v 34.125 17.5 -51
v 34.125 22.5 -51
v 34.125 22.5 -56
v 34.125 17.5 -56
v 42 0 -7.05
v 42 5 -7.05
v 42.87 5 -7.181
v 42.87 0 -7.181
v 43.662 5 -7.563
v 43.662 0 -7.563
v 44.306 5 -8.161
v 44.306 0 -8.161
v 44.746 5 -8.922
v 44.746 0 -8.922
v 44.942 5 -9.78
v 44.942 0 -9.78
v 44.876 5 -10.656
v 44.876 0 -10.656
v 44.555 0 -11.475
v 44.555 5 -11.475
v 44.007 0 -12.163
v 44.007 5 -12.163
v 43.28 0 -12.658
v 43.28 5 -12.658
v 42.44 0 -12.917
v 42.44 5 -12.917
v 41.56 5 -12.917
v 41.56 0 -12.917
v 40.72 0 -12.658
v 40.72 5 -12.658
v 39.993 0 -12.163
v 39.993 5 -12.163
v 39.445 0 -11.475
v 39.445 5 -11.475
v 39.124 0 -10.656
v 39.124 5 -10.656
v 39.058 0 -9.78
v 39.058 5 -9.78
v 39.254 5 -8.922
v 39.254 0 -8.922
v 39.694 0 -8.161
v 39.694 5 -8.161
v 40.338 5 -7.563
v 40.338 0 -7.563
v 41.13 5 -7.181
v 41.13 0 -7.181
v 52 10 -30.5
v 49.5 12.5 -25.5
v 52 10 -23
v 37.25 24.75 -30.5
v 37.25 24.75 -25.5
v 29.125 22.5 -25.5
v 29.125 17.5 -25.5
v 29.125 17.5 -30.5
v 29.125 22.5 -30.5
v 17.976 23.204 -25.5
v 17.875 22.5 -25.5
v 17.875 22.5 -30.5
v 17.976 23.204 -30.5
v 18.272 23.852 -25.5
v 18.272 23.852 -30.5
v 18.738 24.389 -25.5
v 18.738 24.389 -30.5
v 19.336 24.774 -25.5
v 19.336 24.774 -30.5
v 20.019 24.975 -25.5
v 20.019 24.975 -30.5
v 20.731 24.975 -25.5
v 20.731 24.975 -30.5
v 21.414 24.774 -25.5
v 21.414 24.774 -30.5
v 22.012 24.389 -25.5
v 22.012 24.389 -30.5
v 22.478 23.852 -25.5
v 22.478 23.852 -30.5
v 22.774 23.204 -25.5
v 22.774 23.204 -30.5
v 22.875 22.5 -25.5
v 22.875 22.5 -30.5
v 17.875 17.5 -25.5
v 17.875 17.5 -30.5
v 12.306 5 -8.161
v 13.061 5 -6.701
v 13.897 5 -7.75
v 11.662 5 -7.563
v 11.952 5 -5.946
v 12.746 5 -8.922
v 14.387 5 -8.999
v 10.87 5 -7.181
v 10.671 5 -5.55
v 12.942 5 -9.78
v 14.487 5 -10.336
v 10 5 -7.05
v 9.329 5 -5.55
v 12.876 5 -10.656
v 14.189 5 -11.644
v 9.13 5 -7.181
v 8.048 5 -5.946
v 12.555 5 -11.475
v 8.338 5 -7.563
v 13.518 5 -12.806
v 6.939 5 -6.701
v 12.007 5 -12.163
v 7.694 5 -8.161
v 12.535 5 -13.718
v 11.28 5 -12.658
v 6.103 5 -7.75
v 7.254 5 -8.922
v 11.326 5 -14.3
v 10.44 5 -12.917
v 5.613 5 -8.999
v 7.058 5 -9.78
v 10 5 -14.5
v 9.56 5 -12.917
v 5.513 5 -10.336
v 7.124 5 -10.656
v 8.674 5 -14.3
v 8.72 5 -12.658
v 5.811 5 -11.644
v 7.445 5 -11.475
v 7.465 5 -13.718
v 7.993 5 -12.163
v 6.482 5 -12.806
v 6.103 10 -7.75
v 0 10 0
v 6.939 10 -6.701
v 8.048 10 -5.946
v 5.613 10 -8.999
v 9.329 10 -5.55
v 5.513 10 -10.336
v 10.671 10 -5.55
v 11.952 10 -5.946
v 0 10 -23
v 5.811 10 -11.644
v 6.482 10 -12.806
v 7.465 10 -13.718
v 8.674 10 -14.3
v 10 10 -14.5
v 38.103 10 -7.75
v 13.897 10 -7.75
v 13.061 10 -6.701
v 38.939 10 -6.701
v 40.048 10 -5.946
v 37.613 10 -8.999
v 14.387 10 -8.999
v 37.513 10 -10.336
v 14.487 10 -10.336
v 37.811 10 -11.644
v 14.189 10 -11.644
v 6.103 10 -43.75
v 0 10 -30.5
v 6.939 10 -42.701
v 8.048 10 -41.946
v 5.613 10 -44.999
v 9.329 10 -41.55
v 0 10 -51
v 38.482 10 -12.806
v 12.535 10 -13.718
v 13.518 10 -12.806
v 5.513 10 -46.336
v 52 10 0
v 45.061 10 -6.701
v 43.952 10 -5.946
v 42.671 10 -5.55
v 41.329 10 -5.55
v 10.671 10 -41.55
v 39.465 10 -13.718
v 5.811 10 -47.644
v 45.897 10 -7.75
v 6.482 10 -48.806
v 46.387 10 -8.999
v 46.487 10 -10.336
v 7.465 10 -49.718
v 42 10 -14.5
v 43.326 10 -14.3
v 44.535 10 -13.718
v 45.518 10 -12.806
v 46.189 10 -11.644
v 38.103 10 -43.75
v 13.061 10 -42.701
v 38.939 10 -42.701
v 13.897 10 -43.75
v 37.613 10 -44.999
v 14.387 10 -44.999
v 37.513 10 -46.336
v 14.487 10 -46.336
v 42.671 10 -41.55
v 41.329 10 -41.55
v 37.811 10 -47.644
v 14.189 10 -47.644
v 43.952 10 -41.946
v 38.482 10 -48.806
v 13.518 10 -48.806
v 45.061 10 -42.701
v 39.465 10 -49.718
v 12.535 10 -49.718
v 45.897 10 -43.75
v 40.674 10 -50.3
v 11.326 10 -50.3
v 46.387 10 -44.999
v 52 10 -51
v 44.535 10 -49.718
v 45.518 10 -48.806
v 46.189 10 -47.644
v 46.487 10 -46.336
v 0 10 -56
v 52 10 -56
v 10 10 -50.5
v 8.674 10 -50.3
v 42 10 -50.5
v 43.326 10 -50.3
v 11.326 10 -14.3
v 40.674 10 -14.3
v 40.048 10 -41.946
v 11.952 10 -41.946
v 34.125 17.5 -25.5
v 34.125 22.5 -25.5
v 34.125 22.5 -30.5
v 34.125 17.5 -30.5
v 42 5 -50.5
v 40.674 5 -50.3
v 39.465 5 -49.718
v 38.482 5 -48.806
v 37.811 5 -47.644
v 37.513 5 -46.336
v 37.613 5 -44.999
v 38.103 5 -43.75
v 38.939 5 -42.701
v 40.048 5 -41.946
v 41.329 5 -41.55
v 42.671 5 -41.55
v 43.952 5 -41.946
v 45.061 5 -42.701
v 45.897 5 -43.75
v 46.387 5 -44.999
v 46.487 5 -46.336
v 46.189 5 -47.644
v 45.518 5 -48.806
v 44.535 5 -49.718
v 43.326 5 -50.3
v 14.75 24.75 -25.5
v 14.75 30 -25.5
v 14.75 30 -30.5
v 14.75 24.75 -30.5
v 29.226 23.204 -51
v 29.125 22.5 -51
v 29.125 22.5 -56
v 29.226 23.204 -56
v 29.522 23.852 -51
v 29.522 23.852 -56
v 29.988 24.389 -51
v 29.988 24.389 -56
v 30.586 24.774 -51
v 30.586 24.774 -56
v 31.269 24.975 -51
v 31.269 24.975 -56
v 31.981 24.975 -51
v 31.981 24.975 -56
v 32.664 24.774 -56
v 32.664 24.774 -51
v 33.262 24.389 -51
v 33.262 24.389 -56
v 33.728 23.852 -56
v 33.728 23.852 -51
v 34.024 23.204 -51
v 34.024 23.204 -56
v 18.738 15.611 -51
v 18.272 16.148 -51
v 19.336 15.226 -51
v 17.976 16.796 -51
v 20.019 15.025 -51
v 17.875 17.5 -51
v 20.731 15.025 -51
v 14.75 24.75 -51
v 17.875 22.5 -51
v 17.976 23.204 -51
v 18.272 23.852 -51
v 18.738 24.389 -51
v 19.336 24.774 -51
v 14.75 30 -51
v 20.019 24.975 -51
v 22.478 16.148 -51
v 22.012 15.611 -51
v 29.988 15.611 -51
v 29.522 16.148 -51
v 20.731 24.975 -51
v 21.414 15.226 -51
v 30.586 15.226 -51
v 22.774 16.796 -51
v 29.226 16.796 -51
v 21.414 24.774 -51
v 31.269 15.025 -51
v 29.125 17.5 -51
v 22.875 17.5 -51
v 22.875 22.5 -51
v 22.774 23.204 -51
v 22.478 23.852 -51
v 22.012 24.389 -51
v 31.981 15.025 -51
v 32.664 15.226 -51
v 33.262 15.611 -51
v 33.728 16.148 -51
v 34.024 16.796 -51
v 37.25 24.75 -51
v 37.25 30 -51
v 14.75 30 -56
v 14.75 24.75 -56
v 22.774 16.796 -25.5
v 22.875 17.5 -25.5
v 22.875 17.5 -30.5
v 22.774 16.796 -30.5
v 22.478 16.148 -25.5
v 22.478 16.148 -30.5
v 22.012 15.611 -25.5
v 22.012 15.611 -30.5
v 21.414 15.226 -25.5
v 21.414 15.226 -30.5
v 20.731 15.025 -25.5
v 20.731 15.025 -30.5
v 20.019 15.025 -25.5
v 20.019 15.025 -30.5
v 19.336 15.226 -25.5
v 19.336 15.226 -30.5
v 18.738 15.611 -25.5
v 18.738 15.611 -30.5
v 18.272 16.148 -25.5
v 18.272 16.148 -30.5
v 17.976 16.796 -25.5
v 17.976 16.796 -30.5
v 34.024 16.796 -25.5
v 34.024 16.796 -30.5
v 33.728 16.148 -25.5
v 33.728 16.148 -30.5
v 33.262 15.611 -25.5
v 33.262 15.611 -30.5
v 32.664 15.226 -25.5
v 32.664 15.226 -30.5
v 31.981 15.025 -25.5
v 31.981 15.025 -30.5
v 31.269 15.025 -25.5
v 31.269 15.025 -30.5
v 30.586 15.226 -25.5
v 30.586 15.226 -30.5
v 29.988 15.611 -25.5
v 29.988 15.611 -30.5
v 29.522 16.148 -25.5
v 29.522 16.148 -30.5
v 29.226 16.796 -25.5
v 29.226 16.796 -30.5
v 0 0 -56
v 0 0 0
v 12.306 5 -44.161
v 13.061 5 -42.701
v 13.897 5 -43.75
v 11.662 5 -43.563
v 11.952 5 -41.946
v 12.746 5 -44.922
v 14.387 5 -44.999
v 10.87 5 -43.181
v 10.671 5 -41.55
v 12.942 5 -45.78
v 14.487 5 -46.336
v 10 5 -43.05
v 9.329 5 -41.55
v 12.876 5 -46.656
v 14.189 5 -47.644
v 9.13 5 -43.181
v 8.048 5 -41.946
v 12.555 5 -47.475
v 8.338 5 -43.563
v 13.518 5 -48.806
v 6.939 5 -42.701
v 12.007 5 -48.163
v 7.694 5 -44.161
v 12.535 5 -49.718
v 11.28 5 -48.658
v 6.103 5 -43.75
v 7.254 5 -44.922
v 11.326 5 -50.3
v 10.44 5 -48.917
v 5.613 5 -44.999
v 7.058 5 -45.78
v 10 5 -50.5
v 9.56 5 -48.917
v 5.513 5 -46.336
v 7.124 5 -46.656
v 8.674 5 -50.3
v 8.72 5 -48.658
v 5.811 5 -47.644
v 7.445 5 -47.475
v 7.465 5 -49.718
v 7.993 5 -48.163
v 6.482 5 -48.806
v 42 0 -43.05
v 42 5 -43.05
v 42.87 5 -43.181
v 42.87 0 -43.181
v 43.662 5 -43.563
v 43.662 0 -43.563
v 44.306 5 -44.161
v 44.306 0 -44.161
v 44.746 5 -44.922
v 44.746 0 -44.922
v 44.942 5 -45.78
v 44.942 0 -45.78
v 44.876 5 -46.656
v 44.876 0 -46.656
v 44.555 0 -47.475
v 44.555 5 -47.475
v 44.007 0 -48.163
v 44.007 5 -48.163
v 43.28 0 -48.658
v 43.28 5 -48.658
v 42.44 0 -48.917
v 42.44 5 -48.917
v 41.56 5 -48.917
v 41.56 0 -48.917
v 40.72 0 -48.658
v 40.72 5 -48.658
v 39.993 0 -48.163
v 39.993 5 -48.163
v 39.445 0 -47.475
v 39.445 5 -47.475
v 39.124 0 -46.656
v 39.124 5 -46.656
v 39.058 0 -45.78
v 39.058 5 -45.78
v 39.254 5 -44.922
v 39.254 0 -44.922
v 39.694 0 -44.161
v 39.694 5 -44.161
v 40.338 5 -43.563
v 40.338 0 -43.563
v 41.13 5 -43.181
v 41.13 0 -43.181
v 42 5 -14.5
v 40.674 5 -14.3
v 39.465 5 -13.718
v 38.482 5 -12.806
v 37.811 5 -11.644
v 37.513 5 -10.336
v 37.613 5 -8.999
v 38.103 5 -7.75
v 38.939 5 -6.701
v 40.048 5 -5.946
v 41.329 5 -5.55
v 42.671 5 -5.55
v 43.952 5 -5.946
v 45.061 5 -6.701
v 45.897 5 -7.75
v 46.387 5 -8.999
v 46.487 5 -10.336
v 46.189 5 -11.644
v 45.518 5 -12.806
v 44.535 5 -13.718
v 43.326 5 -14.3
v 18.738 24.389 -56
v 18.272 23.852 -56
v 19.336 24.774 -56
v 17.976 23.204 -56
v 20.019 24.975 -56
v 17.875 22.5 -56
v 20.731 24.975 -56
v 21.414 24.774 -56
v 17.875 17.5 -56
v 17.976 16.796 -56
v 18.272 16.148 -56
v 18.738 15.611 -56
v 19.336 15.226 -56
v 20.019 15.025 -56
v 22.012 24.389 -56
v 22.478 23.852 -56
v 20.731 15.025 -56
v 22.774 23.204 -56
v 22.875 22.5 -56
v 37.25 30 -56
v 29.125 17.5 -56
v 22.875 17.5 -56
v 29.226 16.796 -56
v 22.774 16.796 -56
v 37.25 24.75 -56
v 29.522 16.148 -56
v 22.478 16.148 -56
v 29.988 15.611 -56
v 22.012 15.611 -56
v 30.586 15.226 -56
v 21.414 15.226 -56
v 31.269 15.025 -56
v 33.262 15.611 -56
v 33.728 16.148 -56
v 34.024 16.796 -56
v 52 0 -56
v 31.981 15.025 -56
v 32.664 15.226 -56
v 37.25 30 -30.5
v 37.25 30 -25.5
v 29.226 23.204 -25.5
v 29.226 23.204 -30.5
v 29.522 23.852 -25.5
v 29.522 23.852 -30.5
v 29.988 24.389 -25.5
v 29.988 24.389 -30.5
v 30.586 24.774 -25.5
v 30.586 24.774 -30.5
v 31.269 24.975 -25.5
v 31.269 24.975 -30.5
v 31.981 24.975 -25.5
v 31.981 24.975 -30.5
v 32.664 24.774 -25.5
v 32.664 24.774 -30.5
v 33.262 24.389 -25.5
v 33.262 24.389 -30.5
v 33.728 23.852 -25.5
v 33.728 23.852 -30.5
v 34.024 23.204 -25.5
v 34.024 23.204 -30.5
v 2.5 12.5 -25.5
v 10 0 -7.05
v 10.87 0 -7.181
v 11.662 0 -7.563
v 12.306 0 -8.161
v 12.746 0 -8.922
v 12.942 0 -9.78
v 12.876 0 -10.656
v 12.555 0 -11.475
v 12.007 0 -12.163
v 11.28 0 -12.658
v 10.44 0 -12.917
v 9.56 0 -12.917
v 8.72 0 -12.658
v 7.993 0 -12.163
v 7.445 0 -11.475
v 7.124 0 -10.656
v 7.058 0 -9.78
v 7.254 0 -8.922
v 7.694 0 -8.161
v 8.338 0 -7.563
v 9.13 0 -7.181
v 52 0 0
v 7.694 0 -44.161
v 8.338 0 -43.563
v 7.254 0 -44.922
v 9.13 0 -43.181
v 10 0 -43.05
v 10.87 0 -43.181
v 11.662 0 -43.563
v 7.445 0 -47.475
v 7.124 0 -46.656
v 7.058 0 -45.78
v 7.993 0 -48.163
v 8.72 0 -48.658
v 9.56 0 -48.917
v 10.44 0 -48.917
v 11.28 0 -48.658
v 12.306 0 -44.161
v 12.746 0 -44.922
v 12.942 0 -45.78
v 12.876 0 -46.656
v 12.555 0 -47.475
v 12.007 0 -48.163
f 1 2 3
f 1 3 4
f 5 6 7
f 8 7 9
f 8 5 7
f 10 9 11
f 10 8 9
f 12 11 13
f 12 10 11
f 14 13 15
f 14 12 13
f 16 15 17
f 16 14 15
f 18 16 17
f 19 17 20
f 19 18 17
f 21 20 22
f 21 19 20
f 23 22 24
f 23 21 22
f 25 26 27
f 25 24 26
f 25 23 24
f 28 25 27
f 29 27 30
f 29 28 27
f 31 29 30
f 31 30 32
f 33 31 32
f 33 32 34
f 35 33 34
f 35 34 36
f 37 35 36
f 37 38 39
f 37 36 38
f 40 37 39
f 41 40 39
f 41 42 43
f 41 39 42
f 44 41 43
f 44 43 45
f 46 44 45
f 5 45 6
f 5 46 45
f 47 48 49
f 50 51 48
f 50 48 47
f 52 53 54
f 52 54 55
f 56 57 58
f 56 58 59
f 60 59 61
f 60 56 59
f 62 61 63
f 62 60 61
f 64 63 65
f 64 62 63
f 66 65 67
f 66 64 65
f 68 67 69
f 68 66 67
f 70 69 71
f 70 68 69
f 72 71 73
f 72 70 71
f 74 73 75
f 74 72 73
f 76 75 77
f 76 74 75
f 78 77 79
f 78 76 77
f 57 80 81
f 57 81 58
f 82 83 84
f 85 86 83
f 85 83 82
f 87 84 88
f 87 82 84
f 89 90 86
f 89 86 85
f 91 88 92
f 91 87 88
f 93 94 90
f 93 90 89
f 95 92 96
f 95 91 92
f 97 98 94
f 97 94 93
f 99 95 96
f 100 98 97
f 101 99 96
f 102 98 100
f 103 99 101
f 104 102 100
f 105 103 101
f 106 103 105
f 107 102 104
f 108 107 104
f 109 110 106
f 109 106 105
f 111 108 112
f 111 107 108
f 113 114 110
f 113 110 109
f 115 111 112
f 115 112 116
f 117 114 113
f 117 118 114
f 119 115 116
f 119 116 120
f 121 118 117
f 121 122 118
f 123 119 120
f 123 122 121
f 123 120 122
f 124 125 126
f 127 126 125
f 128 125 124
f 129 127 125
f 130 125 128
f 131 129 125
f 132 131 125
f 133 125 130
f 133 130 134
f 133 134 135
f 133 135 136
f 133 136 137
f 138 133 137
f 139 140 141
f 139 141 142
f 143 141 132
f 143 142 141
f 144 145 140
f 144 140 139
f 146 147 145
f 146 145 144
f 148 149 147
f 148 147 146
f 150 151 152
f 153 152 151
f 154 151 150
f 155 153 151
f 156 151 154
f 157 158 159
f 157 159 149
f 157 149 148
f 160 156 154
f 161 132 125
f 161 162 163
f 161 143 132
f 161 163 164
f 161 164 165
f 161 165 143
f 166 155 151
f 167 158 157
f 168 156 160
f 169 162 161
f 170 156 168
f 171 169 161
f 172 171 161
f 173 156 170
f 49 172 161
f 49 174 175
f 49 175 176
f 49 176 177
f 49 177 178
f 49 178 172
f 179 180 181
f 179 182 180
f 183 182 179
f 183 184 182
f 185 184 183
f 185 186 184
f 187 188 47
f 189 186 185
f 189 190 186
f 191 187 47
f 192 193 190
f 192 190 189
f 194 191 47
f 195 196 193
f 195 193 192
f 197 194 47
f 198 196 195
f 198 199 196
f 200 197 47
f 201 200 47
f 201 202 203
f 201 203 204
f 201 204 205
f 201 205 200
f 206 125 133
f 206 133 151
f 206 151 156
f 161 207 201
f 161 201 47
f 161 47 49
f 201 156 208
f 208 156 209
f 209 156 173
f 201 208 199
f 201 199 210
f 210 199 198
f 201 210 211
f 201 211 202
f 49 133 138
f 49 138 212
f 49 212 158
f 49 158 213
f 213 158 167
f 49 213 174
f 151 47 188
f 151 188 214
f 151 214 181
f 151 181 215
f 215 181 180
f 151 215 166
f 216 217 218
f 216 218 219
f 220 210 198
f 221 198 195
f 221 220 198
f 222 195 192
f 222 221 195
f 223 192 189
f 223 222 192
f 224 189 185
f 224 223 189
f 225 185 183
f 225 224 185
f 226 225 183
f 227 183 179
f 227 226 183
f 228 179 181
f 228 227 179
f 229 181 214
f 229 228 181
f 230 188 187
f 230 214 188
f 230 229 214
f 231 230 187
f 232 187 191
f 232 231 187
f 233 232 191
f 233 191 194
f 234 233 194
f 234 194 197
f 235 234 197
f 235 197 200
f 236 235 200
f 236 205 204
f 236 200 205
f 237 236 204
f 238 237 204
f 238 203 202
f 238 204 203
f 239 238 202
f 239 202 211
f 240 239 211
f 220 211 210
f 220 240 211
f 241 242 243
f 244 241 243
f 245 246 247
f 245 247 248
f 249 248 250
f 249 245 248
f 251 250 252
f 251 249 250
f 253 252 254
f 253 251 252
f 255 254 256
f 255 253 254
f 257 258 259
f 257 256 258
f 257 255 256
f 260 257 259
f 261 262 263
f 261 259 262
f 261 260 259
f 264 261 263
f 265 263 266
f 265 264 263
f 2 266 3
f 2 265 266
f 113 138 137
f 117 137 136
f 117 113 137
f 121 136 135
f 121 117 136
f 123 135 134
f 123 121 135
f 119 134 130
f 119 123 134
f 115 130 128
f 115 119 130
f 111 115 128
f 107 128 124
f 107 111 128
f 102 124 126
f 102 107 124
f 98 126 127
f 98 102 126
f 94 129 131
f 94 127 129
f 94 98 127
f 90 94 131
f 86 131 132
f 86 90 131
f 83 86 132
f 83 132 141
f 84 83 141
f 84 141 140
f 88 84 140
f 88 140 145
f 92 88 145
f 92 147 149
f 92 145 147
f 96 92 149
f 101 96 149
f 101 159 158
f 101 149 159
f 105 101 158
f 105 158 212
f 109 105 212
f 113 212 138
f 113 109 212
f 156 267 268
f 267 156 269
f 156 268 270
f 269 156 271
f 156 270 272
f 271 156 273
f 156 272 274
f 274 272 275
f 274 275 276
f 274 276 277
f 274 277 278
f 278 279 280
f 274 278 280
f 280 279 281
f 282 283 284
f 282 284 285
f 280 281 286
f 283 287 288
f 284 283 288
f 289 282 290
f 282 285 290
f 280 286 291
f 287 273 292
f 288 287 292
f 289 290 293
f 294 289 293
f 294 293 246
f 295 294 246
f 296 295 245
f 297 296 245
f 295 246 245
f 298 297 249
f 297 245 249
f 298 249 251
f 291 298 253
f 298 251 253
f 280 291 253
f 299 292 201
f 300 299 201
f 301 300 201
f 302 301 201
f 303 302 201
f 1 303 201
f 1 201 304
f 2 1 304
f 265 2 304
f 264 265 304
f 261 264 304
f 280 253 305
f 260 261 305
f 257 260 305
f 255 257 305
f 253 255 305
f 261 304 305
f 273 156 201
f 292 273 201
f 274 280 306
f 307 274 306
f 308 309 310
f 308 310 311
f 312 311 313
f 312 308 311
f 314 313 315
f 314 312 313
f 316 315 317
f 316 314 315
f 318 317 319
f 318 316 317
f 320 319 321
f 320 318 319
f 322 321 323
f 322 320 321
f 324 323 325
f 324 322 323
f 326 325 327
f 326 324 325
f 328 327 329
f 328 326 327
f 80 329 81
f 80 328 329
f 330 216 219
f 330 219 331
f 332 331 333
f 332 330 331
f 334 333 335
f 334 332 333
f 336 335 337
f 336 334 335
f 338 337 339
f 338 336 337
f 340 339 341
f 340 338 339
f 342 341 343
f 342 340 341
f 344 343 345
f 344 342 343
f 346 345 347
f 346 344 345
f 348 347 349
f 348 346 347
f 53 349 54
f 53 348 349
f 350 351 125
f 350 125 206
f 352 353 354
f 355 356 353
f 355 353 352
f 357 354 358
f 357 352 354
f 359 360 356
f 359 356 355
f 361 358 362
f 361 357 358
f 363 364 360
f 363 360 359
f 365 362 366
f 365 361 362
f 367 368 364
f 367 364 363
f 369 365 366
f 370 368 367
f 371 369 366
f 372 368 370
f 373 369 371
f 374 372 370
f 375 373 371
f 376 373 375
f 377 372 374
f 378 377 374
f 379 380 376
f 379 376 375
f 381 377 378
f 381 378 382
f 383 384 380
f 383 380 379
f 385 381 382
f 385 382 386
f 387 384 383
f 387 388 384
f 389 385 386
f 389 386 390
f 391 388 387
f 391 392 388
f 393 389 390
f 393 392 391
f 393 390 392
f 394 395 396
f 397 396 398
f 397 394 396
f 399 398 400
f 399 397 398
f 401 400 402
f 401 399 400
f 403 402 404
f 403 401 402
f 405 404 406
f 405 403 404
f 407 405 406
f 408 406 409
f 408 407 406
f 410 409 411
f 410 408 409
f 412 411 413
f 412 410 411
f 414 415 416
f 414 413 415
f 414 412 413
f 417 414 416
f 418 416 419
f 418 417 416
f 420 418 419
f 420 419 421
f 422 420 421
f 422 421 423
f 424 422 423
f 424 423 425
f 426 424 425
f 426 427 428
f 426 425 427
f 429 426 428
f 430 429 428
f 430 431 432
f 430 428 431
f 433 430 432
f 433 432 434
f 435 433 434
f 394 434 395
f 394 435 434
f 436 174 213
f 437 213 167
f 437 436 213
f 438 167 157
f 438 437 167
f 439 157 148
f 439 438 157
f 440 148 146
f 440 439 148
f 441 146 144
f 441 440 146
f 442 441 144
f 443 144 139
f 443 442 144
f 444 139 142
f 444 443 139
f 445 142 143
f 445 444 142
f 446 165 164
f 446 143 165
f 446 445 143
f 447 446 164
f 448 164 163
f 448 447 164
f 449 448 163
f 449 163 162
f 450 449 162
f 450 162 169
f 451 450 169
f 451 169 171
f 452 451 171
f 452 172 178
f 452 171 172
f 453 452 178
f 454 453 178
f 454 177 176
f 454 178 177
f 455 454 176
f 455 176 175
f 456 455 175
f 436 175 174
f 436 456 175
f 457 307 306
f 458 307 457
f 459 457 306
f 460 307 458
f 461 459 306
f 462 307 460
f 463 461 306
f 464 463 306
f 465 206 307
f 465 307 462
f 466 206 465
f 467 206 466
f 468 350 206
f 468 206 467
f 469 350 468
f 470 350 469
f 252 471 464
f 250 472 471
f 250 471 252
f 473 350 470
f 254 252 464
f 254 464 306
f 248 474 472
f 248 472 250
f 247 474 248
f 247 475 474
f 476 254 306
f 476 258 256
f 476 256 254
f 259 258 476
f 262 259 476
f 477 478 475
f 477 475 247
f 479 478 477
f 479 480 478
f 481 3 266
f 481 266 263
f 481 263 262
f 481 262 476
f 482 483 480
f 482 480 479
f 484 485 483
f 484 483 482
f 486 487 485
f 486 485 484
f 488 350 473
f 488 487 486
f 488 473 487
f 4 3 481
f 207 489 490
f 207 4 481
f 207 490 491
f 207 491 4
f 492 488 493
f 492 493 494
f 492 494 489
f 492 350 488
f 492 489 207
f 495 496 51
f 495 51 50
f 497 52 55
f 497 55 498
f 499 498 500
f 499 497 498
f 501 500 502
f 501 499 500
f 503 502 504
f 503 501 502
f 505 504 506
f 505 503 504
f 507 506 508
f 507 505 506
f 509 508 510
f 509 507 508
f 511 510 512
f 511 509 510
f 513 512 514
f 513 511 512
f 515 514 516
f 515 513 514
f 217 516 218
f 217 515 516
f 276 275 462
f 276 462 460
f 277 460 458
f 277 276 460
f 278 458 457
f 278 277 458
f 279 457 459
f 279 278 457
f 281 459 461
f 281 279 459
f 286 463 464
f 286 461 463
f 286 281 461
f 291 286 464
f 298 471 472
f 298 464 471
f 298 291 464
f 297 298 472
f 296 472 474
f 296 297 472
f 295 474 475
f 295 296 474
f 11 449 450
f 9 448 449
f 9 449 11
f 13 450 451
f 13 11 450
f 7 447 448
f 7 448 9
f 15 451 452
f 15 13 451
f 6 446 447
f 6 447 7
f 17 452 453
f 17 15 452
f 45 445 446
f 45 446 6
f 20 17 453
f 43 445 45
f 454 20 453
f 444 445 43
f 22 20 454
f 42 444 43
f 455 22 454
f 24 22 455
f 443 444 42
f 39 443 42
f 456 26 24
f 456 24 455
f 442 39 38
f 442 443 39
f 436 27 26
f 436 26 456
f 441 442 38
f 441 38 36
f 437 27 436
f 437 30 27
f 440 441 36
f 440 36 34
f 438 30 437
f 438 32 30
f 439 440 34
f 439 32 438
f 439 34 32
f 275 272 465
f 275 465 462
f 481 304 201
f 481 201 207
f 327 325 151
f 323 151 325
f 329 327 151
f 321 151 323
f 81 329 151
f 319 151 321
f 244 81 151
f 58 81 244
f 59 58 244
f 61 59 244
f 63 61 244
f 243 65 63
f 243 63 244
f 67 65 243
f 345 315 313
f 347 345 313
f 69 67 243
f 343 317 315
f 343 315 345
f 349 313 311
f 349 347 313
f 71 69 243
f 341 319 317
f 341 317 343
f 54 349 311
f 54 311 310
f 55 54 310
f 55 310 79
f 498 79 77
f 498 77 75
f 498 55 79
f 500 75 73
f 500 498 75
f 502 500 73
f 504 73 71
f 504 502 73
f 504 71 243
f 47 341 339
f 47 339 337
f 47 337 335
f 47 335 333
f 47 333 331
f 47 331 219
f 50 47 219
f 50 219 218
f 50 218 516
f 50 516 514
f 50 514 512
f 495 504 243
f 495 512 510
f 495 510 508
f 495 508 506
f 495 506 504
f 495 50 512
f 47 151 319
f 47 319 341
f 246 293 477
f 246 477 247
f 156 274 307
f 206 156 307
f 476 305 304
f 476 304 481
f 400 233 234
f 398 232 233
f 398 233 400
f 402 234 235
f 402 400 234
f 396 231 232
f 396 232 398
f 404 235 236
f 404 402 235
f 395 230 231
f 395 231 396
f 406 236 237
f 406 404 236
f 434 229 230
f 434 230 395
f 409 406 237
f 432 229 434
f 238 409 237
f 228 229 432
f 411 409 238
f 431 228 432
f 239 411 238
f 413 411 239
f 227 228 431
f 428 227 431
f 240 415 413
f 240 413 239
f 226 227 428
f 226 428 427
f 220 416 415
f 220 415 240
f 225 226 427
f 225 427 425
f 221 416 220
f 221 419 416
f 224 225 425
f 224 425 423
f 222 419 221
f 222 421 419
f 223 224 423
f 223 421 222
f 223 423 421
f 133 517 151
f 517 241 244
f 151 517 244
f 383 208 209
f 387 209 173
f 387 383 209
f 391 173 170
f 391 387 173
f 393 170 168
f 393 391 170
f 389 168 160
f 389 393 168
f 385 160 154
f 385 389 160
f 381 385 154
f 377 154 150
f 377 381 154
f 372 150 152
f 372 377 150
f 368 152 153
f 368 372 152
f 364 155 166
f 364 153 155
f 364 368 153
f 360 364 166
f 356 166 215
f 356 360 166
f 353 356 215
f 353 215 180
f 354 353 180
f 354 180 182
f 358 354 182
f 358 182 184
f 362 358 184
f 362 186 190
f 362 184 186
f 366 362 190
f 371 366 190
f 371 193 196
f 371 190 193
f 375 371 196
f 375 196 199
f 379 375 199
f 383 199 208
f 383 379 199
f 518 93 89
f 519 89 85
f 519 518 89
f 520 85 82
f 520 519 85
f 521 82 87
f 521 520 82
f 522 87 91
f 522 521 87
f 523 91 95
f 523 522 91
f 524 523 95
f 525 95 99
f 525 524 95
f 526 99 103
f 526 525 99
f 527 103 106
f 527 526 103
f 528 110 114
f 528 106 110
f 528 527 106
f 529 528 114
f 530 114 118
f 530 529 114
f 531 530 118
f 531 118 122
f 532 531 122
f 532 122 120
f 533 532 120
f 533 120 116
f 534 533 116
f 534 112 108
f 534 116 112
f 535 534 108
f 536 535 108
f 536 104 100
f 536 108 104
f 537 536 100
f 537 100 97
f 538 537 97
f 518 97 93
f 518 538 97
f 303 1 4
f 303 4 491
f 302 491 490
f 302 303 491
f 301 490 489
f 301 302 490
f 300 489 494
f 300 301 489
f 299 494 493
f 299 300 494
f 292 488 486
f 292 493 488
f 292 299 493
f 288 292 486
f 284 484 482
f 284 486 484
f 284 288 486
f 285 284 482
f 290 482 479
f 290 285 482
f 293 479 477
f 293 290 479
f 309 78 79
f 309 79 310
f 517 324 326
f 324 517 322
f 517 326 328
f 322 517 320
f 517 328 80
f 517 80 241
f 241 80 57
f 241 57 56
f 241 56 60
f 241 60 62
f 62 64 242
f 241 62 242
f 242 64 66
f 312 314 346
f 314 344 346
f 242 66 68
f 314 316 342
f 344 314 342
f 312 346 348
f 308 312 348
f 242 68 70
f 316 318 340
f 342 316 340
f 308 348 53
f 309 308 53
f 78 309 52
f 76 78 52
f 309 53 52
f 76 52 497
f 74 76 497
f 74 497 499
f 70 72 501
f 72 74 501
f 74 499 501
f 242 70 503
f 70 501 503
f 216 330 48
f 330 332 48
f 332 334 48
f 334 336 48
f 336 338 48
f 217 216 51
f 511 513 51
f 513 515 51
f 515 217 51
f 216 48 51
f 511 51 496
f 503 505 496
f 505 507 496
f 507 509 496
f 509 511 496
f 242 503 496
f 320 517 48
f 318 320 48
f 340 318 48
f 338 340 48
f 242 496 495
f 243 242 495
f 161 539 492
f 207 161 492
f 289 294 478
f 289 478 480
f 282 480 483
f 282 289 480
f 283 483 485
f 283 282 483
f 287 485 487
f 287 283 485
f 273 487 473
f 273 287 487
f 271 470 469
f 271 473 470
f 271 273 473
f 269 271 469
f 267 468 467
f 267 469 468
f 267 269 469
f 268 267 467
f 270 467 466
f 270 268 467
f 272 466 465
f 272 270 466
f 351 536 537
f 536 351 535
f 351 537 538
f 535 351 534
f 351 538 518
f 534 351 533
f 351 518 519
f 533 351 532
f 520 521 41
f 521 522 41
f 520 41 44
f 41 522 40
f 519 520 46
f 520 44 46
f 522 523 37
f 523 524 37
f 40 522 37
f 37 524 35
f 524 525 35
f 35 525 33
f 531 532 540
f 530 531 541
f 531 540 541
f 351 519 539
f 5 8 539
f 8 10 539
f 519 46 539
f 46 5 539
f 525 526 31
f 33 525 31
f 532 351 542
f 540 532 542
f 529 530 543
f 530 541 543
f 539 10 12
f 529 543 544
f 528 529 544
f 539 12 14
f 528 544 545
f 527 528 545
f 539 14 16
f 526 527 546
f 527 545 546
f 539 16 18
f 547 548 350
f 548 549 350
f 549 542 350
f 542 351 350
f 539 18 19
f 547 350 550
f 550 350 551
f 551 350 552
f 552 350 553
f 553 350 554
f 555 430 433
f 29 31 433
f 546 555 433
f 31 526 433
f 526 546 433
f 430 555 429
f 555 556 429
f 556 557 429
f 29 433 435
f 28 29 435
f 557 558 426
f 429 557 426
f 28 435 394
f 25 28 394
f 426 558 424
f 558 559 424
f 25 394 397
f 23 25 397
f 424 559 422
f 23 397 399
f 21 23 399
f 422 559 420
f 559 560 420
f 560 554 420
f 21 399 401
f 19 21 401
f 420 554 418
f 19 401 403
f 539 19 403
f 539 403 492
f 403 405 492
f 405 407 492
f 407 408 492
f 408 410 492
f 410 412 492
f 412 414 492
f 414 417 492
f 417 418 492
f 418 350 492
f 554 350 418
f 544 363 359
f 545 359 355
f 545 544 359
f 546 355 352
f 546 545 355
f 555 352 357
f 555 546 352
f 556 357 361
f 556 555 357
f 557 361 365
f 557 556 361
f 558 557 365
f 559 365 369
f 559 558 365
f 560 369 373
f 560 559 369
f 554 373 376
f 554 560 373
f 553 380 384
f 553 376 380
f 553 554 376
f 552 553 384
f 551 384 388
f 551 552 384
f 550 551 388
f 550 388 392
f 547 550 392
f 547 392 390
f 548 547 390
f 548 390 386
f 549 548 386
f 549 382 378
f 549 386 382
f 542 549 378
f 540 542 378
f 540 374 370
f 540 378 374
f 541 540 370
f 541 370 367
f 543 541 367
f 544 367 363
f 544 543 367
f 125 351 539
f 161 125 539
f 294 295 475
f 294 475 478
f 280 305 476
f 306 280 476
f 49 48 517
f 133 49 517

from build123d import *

# Parameters (mm, degrees)
SKETCH1_W               = 52
SKETCH1_H               = 56
SKETCH1_R               = 2.95
BOSS_EXTRUDE1_DEPTH     = 10
CUT_EXTRUDE1_DEPTH      = 78.071395472
CUT_EXTRUDE1_DEPTH_BACK = 5
SKETCH2_R               = 4.5
BOSS_EXTRUDE2_START     = -14.75
SKETCH3_W               = 5
SKETCH3_H               = 20
BOSS_EXTRUDE2_DEPTH     = 22.5
CUT_EXTRUDE2_REACH      = 69.337
CHAMFER1_SIZE           = 14.75
CHAMFER2_SIZE           = 2.5


with BuildPart() as part:
    # Sketch1 → Boss-Extrude1 (new body)
    with BuildSketch(Plane(origin=(0, 0, 0), x_dir=(1, 0, 0), z_dir=(0, 1, 0))):
        with Locations((26, 28)):
            Rectangle(SKETCH1_W, SKETCH1_H)
        with Locations(Location((10, 46, 0), (0, 0, 270))):
            Circle(SKETCH1_R, mode=Mode.SUBTRACT)
        with Locations(Location((42, 46, 0), (0, 0, 270))):
            Circle(SKETCH1_R, mode=Mode.SUBTRACT)
        with Locations(Location((42, 10, 0), (0, 0, 270))):
            Circle(SKETCH1_R, mode=Mode.SUBTRACT)
        with Locations(Location((10, 10, 0), (0, 0, 270))):
            Circle(SKETCH1_R, mode=Mode.SUBTRACT)
    extrude(amount=BOSS_EXTRUDE1_DEPTH)

    # Sketch2 → Cut-Extrude1 (cut, two sides: drawn at the far end of the back side and taken through both)
    with BuildSketch(Plane(origin=(0, 10, 0), x_dir=(1, 0, 0), z_dir=(0, 1, 0)).offset(-CUT_EXTRUDE1_DEPTH_BACK)):
        with Locations(Location((10, 10, 0), (0, 0, 90))):
            Circle(SKETCH2_R)
        with Locations(Location((42, 10, 0), (0, 0, 90))):
            Circle(SKETCH2_R)
        with Locations(Location((42, 46, 0), (0, 0, 90))):
            Circle(SKETCH2_R)
        with Locations(Location((10, 46, 0), (0, 0, 90))):
            Circle(SKETCH2_R)
    extrude(amount=CUT_EXTRUDE1_DEPTH + CUT_EXTRUDE1_DEPTH_BACK, mode=Mode.SUBTRACT)

    # Sketch3 → Boss-Extrude2 (add)
    with BuildSketch(Plane(origin=(52, 0, 0), x_dir=(0, 0, -1), z_dir=(1, 0, 0)).offset(BOSS_EXTRUDE2_START)):
        with Locations((28, 20)):
            Rectangle(SKETCH3_W, SKETCH3_H)
        with Locations((53.5, 20)):
            Rectangle(SKETCH3_W, SKETCH3_H)
    extrude(amount=-BOSS_EXTRUDE2_DEPTH)

    # Cut-Extrude2: up to this face of the body (flat: up to its plane)
    cut_extrude2_end = Plane(part.part.faces().sort_by_distance((26, 11.958762887, -56))[0])
    # Sketch4 → Cut-Extrude2 (cut, up to the picked face)
    with BuildSketch(Plane.XY.offset(-25.5), mode=Mode.PRIVATE) as cut_extrude2_sk1:
        with BuildLine():
            Line((22.875, 22.5), (22.875, 17.5))
            ThreePointArc((22.875, 17.5), (20.375, 15), (17.875, 17.5))
            Line((17.875, 17.5), (17.875, 22.5))
            ThreePointArc((17.875, 22.5), (20.375, 25), (22.875, 22.5))
        make_face()
    cut_extrude2_tool1 = split(extrude(cut_extrude2_sk1.sketch, amount=-CUT_EXTRUDE2_REACH, mode=Mode.PRIVATE), bisect_by=cut_extrude2_end, keep=Keep.BOTH, mode=Mode.PRIVATE)
    # Sketch4 → Cut-Extrude2 (cut, up to the picked face)
    with BuildSketch(Plane.XY.offset(-25.5), mode=Mode.PRIVATE) as cut_extrude2_sk2:
        with BuildLine():
            Line((34.125, 22.5), (34.125, 17.5))
            ThreePointArc((34.125, 17.5), (31.625, 15), (29.125, 17.5))
            Line((29.125, 17.5), (29.125, 22.5))
            ThreePointArc((29.125, 22.5), (31.625, 25), (34.125, 22.5))
        make_face()
    cut_extrude2_tool2 = split(extrude(cut_extrude2_sk2.sketch, amount=-CUT_EXTRUDE2_REACH, mode=Mode.PRIVATE), bisect_by=cut_extrude2_end, keep=Keep.BOTH, mode=Mode.PRIVATE)
    add(cut_extrude2_tool1.solids().sort_by(Axis((20.375, 20, -25.5), (0, 0, -1)))[0], mode=Mode.SUBTRACT)
    add(cut_extrude2_tool2.solids().sort_by(Axis((31.625, 20, -25.5), (0, 0, -1)))[0], mode=Mode.SUBTRACT)

    # Chamfer1
    chamfer1_edges = [part.edges().sort_by_distance(p)[0] for p in [
        (37.25, 10, -53.5),
        (37.25, 10, -28),
        (14.75, 10, -53.5),
        (14.75, 10, -28),
    ]]
    chamfer(chamfer1_edges, length=CHAMFER1_SIZE - 0.0001)  # a hair under: the kernel refuses the full size

    # Chamfer2
    chamfer2_edges = [part.edges().sort_by_distance(p)[0] for p in [
        (26, 10, -25.5),
    ]]
    chamfer(chamfer2_edges, length=CHAMFER2_SIZE)


solid = part.part
